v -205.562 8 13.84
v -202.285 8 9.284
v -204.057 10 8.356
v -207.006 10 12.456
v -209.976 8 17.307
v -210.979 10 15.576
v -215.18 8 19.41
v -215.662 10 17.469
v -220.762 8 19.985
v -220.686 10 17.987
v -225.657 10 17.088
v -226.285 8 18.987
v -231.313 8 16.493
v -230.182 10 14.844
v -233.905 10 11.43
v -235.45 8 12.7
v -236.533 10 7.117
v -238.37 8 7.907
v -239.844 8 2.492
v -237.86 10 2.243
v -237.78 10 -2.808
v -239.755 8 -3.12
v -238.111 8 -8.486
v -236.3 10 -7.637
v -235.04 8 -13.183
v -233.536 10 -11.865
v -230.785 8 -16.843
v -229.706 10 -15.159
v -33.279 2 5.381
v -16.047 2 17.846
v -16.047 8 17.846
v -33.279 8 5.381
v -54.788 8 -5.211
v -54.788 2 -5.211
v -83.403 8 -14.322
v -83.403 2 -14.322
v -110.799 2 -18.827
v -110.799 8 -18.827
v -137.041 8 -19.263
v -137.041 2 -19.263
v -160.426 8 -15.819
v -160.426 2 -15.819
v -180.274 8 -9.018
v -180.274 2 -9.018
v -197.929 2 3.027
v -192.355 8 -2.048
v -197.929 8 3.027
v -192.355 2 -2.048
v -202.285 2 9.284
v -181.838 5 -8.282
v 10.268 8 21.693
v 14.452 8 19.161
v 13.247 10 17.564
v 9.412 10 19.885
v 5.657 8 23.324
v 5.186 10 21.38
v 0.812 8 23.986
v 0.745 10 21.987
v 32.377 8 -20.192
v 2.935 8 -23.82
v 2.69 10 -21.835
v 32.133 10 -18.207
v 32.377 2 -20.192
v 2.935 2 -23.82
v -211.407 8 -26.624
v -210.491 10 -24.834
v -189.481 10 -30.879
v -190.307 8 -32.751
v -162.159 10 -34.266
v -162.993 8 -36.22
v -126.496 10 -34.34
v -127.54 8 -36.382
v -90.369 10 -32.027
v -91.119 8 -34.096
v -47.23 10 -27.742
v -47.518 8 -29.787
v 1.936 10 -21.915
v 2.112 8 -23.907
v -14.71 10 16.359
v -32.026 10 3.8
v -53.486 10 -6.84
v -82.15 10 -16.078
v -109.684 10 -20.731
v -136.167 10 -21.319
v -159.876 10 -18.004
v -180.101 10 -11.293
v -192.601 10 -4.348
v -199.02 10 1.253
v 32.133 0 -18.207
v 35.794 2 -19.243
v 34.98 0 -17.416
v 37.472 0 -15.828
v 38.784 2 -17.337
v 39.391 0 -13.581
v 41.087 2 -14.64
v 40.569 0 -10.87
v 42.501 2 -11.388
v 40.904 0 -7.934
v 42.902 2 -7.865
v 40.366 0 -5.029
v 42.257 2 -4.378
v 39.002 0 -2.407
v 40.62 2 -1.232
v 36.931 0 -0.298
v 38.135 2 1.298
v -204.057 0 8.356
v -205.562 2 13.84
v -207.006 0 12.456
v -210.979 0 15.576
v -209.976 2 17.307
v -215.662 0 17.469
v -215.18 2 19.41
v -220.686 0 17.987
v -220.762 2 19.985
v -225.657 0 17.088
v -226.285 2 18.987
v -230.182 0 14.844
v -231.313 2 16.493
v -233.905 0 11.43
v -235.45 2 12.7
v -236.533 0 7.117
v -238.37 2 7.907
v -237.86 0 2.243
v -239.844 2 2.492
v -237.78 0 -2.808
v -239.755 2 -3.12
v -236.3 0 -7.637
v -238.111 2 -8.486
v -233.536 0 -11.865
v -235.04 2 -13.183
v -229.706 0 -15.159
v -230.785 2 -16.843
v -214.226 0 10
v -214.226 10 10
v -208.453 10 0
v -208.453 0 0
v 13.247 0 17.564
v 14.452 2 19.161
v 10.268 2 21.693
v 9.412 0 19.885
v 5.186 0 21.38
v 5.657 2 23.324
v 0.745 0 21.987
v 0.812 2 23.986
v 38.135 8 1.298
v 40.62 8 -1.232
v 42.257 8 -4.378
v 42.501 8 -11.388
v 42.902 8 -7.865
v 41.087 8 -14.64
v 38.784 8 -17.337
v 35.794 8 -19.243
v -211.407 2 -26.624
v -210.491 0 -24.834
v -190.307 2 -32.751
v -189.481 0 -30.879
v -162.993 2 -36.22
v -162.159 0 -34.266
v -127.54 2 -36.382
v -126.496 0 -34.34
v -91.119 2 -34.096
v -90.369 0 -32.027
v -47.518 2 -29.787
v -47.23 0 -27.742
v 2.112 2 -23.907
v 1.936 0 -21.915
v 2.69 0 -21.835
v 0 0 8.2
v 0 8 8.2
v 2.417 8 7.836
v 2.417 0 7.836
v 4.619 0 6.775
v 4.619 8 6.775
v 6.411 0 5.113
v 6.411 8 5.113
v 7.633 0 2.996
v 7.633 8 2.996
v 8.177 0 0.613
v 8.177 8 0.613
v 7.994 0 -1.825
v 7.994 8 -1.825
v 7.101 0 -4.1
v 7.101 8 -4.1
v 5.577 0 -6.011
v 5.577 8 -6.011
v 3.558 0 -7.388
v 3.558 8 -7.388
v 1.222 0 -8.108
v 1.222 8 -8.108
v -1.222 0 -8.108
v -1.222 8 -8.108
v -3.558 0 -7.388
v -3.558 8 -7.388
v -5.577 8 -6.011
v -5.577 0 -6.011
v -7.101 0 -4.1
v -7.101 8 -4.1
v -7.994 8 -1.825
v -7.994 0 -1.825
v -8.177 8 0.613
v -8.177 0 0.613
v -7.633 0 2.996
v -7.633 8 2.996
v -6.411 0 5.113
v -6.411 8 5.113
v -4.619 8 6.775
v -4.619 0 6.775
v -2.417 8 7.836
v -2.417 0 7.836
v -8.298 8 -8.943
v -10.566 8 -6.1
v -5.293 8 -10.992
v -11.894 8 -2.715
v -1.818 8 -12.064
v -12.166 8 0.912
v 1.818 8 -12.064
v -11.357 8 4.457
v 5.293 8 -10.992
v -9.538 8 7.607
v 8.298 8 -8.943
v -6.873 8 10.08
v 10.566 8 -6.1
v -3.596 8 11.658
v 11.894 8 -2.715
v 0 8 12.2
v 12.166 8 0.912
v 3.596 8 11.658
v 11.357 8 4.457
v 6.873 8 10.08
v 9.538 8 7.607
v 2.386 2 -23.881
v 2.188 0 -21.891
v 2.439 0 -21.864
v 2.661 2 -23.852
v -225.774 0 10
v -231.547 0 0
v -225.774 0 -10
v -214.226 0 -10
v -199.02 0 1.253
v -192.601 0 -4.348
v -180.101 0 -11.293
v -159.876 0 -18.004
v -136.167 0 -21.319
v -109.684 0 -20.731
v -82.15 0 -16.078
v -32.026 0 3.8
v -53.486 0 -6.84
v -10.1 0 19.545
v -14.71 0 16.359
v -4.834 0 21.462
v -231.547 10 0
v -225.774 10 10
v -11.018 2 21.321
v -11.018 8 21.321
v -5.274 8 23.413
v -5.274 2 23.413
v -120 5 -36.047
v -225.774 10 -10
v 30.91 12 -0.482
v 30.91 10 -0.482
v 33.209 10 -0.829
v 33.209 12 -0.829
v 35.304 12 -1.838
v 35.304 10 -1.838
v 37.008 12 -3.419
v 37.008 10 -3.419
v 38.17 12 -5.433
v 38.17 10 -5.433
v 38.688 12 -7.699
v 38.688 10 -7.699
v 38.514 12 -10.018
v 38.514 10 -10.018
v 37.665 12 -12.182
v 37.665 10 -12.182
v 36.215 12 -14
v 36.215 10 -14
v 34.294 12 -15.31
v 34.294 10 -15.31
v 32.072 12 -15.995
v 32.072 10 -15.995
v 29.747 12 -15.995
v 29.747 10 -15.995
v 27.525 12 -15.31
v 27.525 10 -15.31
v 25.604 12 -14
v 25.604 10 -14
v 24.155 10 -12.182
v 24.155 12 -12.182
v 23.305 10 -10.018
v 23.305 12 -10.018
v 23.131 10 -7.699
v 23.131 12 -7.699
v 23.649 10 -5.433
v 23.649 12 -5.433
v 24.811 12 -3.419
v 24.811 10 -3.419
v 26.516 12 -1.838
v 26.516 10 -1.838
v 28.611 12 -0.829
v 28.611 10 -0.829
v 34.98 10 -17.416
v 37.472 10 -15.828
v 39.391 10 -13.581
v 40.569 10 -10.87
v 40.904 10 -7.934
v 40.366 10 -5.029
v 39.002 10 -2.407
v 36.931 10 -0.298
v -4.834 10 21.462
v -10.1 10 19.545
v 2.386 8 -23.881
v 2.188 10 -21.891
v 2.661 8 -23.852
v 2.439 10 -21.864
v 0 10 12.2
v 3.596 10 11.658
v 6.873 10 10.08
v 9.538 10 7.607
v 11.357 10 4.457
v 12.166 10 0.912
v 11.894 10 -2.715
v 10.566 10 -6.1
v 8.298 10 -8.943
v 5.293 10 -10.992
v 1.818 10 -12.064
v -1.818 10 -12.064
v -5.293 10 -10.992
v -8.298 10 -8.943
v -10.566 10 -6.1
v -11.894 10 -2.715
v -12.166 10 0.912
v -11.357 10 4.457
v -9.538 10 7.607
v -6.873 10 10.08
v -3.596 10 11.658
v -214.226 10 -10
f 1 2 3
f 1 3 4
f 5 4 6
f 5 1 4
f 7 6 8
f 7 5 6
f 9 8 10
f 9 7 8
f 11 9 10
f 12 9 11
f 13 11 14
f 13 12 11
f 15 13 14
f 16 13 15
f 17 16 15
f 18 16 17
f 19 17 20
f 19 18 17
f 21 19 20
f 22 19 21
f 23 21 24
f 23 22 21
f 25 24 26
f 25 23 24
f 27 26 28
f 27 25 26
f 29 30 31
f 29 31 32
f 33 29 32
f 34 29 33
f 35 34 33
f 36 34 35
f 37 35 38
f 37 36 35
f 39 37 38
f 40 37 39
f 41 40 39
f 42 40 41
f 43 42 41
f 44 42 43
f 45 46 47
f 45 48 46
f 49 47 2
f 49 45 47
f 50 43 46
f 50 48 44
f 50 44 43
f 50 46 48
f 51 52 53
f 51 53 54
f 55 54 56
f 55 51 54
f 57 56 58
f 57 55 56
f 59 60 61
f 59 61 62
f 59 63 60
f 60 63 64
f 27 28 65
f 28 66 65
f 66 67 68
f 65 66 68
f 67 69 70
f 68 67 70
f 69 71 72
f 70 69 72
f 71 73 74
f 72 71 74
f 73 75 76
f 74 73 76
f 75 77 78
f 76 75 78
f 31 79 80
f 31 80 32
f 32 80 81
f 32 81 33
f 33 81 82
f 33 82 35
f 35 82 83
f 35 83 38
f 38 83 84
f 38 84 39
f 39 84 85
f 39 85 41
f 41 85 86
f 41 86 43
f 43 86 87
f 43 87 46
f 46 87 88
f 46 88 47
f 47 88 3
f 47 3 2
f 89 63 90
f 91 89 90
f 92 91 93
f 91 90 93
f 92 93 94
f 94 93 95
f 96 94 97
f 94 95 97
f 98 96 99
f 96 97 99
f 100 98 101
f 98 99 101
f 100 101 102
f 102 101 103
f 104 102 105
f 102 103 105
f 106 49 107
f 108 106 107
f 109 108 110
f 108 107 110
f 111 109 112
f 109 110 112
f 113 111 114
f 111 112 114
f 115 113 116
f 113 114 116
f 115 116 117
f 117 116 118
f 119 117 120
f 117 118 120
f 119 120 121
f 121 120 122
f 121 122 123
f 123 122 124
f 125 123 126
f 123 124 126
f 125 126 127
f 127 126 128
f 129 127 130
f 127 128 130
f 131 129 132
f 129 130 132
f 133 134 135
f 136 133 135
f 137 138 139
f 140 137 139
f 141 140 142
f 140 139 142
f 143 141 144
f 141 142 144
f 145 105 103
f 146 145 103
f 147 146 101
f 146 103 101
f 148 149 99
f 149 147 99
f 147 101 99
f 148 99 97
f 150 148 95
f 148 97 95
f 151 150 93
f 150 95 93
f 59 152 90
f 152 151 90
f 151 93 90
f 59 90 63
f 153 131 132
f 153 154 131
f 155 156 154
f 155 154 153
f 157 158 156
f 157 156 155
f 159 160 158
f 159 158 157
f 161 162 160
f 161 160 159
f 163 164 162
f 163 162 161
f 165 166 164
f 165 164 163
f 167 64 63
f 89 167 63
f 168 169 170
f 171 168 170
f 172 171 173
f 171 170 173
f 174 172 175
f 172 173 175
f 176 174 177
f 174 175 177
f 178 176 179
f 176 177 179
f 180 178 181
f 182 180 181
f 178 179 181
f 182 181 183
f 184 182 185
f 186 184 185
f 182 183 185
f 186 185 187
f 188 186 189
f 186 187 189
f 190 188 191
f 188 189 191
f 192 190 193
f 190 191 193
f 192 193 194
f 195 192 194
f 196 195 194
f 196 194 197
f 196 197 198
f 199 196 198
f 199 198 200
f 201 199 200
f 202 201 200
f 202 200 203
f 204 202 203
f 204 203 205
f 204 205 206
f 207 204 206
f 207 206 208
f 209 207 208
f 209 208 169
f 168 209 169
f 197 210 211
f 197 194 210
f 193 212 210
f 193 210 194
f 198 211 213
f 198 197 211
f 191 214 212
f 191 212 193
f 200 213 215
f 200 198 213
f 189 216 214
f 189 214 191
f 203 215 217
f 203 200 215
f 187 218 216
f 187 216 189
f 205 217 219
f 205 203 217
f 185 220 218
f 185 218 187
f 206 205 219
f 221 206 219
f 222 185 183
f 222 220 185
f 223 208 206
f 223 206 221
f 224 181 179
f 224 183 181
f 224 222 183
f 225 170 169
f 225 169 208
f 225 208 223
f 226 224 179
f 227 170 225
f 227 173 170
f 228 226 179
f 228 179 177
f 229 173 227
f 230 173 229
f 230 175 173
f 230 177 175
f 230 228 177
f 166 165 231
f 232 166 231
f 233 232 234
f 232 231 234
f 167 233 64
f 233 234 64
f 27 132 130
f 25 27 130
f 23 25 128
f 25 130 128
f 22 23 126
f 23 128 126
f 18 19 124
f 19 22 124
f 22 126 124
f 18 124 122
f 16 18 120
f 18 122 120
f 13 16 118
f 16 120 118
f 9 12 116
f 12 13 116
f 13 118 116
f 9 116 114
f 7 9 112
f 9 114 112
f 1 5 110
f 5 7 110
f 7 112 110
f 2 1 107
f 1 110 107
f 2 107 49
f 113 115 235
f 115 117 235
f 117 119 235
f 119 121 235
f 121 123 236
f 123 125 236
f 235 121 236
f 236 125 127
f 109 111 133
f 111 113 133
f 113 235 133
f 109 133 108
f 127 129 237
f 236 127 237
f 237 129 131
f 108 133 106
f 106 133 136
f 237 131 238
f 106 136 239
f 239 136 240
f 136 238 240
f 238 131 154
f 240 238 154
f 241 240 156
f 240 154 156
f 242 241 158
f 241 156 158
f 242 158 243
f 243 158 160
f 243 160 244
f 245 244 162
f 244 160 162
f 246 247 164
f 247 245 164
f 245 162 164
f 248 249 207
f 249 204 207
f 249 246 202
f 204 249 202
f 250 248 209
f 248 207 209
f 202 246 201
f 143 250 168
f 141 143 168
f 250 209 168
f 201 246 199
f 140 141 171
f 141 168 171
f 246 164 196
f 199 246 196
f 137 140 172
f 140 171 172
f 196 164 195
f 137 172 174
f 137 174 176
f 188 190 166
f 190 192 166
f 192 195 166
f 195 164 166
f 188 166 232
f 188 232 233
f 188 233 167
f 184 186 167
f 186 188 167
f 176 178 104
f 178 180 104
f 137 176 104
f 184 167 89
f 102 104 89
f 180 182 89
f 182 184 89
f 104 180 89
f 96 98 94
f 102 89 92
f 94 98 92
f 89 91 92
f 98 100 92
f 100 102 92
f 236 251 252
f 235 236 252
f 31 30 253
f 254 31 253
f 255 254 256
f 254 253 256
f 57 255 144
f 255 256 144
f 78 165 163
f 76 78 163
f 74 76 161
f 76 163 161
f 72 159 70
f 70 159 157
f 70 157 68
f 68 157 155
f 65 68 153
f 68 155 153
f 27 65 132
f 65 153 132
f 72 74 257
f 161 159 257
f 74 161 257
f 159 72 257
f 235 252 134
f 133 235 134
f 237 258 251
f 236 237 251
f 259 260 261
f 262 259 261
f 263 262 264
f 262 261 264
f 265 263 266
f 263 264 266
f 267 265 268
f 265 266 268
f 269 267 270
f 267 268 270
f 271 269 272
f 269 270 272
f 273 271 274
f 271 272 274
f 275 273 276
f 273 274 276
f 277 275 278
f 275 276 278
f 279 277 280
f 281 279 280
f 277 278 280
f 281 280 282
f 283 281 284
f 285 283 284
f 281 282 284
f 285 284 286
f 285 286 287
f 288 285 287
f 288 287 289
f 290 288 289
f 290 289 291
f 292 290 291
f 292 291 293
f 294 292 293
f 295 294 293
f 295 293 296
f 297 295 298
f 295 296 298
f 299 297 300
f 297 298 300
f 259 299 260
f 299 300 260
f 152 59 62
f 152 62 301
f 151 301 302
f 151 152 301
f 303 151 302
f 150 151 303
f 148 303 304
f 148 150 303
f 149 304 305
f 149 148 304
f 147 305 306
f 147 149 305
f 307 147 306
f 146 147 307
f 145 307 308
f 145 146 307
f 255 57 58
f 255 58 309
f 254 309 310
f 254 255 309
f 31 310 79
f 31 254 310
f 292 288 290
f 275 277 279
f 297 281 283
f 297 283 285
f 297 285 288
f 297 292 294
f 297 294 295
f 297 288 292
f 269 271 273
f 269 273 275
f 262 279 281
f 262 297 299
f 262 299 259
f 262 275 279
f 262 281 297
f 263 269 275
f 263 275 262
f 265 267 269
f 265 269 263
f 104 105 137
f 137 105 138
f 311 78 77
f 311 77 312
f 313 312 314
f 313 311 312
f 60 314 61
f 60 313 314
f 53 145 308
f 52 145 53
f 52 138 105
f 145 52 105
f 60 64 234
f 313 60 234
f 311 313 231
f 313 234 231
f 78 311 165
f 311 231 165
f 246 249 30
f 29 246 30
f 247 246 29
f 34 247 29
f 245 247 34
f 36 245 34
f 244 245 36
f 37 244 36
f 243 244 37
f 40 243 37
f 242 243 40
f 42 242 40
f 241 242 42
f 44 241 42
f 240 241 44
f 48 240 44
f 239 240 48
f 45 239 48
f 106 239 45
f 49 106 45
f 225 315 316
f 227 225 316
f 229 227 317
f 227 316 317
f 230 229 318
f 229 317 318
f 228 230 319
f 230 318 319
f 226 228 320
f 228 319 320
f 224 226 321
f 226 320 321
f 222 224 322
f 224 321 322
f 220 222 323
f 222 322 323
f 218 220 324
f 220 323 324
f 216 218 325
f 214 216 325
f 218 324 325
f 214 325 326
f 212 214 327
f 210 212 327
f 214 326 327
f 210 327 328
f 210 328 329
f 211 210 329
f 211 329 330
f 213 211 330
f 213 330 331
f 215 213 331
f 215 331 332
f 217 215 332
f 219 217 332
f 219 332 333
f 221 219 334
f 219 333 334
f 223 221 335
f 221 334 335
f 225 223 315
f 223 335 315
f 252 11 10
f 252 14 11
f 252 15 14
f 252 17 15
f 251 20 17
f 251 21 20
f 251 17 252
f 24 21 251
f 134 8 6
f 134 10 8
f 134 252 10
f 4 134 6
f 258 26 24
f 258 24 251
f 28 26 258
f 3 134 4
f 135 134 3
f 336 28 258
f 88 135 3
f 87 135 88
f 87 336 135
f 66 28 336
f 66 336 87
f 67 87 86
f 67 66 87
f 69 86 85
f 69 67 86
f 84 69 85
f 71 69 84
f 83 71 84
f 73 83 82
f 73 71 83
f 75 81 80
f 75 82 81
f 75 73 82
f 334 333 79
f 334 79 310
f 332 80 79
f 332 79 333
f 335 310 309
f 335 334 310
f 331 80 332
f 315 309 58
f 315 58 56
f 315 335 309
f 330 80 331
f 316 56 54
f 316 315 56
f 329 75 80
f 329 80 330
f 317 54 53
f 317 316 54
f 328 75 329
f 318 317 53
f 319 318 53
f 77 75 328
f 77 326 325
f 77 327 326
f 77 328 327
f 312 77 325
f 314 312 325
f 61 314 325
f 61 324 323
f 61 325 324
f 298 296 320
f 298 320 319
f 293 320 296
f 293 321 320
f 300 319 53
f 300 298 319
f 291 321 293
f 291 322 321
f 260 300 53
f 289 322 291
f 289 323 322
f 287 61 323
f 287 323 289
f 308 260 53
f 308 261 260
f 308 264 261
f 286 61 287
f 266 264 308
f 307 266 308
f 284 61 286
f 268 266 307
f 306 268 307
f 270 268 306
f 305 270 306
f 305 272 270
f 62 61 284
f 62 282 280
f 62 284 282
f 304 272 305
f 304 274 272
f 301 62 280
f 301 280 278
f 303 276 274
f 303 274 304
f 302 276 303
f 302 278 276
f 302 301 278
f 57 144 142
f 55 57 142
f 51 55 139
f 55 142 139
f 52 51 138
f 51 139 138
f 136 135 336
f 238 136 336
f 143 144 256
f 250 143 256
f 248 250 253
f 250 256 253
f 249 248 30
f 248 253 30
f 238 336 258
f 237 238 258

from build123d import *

# Parameters (mm, degrees)
EXTRUDE_1_DEPTH     = 10
SKETCH_2_R          = 8.2
CUT_EXTRUDE_1_DEPTH = 10
SKETCH_3_R          = 7.8
EXTRUDE_2_DEPTH     = 2
CUT_EXTRUDE_2_DEPTH = 244.001178821
CHAMFER_1_SIZE      = 2
SKETCH_12_R         = 12.2
CUT_EXTRUDE_3_DEPTH = 2


with BuildPart() as part:
    # 草图1 → 凸台-拉伸1 (new body)
    with BuildSketch(Plane(origin=(0, 0, 0), x_dir=(1, 0, 0), z_dir=(0, 1, 0))):
        with BuildLine():
            ThreePointArc((38.135472776, -1.298351331), (42.500736357, 11.388037985), (32.377112543, 20.192141624))
            Line((32.377112543, 20.192141624), (2.934972204, 23.819864361))
            ThreePointArc((2.934972204, 23.819864361), (2.523648479, 23.866947822), (2.111573774, 23.906929042))
            add(Edge.make_bspline(
                [(2.111573774, 23.906929042), (-9.810921984, 24.95998062), (-117.579356421, 40.552472419), (-200.501701748, 36.233495272), (-230.78473121, 16.843086794)],
                knots=[0, 0, 0, 0, 0.545538067, 1, 1, 1, 1], degree=3))
            ThreePointArc((-230.78473121, 16.843086794), (-233.515274748, -14.74236577), (-202.285423784, -9.284061046))
            add(Edge.make_bspline(
                [(-16.047074382, -17.846327459), (-50.225325952, 12.886098942), (-142.28144772, 36.786073578), (-197.939957095, -0.992635508), (-202.285423784, -9.284061046)],
                knots=[0, 0, 0, 0, 0.861614938, 1, 1, 1, 1], degree=3))
            ThreePointArc((-16.047074382, -17.846327459), (-8.21278774, -22.551055797), (0.812217897, -23.986252356))
            ThreePointArc((0.812217897, -23.986252356), (8.004199727, -22.625931732), (14.451692669, -19.161121549))
            Line((14.451692669, -19.161121549), (38.135472776, -1.298351331))
        make_face()
    extrude(amount=EXTRUDE_1_DEPTH)

    # 草图2 → 切除-拉伸1 (cut)
    with BuildSketch(Plane(origin=(0, 10, 0), x_dir=(1, 0, 0), z_dir=(0, 1, 0))):
        with Locations(Location((0, 0, 0), (0, 0, 270))):
            Circle(SKETCH_2_R)
    extrude(amount=-CUT_EXTRUDE_1_DEPTH, mode=Mode.SUBTRACT)

    # 草图3 → 凸台-拉伸2 (add)
    with BuildSketch(Plane(origin=(0, 10, 0), x_dir=(1, 0, 0), z_dir=(0, 1, 0))):
        with Locations(Location((30.909626441, 8.282209443, 0), (0, 0, 270))):
            Circle(SKETCH_3_R)
    extrude(amount=EXTRUDE_2_DEPTH)

    # 草图6 → 切除-拉伸2 (cut, through all)
    with BuildSketch(Plane(origin=(0, 10, 0), x_dir=(1, 0, 0), z_dir=(0, 1, 0))):
        Polygon((-208.452994616, 0), (-214.226497308, 10), (-225.773502692, 10), (-231.547005384, 0), (-225.773502692, -10), (-214.226497308, -10), align=None)
    extrude(amount=-CUT_EXTRUDE_2_DEPTH, mode=Mode.SUBTRACT)

    # 倒角1
    chamfer_1_edges = [part.edges().sort_by_distance(p)[0] for p in [
        (-109.293214932, 0, -18.683029708),
        (2.523648479, 0, -23.866947822),
        (-233.515274748, 0, 14.74236577),
        (17.656042374, 0, -22.006002992),
        (-109.293214932, 0, -18.683029708),
        (42.500736357, 0, -11.388037985),
        (-1.033673825, 0, 23.977729634),
        (26.293582722, 0, 10.22973644),
        (-109.293214932, 10, -18.683029708),
        (2.523648479, 10, -23.866947822),
        (-233.515274748, 10, 14.74236577),
        (17.656042374, 10, -22.006002992),
        (-109.293214932, 10, -18.683029708),
        (42.500736357, 10, -11.388037985),
        (-1.033673825, 10, 23.977729634),
        (26.293582722, 10, 10.22973644),
    ]]
    chamfer(chamfer_1_edges, length=CHAMFER_1_SIZE)

    # 草图12 → 切除-拉伸3 (cut)
    with BuildSketch(Plane(origin=(0, 10, 0), x_dir=(1, 0, 0), z_dir=(0, 1, 0))):
        with Locations(Location((0, 0, 0), (0, 0, 270))):
            Circle(SKETCH_12_R)
    extrude(amount=-CUT_EXTRUDE_3_DEPTH, mode=Mode.SUBTRACT)


solid = part.part
